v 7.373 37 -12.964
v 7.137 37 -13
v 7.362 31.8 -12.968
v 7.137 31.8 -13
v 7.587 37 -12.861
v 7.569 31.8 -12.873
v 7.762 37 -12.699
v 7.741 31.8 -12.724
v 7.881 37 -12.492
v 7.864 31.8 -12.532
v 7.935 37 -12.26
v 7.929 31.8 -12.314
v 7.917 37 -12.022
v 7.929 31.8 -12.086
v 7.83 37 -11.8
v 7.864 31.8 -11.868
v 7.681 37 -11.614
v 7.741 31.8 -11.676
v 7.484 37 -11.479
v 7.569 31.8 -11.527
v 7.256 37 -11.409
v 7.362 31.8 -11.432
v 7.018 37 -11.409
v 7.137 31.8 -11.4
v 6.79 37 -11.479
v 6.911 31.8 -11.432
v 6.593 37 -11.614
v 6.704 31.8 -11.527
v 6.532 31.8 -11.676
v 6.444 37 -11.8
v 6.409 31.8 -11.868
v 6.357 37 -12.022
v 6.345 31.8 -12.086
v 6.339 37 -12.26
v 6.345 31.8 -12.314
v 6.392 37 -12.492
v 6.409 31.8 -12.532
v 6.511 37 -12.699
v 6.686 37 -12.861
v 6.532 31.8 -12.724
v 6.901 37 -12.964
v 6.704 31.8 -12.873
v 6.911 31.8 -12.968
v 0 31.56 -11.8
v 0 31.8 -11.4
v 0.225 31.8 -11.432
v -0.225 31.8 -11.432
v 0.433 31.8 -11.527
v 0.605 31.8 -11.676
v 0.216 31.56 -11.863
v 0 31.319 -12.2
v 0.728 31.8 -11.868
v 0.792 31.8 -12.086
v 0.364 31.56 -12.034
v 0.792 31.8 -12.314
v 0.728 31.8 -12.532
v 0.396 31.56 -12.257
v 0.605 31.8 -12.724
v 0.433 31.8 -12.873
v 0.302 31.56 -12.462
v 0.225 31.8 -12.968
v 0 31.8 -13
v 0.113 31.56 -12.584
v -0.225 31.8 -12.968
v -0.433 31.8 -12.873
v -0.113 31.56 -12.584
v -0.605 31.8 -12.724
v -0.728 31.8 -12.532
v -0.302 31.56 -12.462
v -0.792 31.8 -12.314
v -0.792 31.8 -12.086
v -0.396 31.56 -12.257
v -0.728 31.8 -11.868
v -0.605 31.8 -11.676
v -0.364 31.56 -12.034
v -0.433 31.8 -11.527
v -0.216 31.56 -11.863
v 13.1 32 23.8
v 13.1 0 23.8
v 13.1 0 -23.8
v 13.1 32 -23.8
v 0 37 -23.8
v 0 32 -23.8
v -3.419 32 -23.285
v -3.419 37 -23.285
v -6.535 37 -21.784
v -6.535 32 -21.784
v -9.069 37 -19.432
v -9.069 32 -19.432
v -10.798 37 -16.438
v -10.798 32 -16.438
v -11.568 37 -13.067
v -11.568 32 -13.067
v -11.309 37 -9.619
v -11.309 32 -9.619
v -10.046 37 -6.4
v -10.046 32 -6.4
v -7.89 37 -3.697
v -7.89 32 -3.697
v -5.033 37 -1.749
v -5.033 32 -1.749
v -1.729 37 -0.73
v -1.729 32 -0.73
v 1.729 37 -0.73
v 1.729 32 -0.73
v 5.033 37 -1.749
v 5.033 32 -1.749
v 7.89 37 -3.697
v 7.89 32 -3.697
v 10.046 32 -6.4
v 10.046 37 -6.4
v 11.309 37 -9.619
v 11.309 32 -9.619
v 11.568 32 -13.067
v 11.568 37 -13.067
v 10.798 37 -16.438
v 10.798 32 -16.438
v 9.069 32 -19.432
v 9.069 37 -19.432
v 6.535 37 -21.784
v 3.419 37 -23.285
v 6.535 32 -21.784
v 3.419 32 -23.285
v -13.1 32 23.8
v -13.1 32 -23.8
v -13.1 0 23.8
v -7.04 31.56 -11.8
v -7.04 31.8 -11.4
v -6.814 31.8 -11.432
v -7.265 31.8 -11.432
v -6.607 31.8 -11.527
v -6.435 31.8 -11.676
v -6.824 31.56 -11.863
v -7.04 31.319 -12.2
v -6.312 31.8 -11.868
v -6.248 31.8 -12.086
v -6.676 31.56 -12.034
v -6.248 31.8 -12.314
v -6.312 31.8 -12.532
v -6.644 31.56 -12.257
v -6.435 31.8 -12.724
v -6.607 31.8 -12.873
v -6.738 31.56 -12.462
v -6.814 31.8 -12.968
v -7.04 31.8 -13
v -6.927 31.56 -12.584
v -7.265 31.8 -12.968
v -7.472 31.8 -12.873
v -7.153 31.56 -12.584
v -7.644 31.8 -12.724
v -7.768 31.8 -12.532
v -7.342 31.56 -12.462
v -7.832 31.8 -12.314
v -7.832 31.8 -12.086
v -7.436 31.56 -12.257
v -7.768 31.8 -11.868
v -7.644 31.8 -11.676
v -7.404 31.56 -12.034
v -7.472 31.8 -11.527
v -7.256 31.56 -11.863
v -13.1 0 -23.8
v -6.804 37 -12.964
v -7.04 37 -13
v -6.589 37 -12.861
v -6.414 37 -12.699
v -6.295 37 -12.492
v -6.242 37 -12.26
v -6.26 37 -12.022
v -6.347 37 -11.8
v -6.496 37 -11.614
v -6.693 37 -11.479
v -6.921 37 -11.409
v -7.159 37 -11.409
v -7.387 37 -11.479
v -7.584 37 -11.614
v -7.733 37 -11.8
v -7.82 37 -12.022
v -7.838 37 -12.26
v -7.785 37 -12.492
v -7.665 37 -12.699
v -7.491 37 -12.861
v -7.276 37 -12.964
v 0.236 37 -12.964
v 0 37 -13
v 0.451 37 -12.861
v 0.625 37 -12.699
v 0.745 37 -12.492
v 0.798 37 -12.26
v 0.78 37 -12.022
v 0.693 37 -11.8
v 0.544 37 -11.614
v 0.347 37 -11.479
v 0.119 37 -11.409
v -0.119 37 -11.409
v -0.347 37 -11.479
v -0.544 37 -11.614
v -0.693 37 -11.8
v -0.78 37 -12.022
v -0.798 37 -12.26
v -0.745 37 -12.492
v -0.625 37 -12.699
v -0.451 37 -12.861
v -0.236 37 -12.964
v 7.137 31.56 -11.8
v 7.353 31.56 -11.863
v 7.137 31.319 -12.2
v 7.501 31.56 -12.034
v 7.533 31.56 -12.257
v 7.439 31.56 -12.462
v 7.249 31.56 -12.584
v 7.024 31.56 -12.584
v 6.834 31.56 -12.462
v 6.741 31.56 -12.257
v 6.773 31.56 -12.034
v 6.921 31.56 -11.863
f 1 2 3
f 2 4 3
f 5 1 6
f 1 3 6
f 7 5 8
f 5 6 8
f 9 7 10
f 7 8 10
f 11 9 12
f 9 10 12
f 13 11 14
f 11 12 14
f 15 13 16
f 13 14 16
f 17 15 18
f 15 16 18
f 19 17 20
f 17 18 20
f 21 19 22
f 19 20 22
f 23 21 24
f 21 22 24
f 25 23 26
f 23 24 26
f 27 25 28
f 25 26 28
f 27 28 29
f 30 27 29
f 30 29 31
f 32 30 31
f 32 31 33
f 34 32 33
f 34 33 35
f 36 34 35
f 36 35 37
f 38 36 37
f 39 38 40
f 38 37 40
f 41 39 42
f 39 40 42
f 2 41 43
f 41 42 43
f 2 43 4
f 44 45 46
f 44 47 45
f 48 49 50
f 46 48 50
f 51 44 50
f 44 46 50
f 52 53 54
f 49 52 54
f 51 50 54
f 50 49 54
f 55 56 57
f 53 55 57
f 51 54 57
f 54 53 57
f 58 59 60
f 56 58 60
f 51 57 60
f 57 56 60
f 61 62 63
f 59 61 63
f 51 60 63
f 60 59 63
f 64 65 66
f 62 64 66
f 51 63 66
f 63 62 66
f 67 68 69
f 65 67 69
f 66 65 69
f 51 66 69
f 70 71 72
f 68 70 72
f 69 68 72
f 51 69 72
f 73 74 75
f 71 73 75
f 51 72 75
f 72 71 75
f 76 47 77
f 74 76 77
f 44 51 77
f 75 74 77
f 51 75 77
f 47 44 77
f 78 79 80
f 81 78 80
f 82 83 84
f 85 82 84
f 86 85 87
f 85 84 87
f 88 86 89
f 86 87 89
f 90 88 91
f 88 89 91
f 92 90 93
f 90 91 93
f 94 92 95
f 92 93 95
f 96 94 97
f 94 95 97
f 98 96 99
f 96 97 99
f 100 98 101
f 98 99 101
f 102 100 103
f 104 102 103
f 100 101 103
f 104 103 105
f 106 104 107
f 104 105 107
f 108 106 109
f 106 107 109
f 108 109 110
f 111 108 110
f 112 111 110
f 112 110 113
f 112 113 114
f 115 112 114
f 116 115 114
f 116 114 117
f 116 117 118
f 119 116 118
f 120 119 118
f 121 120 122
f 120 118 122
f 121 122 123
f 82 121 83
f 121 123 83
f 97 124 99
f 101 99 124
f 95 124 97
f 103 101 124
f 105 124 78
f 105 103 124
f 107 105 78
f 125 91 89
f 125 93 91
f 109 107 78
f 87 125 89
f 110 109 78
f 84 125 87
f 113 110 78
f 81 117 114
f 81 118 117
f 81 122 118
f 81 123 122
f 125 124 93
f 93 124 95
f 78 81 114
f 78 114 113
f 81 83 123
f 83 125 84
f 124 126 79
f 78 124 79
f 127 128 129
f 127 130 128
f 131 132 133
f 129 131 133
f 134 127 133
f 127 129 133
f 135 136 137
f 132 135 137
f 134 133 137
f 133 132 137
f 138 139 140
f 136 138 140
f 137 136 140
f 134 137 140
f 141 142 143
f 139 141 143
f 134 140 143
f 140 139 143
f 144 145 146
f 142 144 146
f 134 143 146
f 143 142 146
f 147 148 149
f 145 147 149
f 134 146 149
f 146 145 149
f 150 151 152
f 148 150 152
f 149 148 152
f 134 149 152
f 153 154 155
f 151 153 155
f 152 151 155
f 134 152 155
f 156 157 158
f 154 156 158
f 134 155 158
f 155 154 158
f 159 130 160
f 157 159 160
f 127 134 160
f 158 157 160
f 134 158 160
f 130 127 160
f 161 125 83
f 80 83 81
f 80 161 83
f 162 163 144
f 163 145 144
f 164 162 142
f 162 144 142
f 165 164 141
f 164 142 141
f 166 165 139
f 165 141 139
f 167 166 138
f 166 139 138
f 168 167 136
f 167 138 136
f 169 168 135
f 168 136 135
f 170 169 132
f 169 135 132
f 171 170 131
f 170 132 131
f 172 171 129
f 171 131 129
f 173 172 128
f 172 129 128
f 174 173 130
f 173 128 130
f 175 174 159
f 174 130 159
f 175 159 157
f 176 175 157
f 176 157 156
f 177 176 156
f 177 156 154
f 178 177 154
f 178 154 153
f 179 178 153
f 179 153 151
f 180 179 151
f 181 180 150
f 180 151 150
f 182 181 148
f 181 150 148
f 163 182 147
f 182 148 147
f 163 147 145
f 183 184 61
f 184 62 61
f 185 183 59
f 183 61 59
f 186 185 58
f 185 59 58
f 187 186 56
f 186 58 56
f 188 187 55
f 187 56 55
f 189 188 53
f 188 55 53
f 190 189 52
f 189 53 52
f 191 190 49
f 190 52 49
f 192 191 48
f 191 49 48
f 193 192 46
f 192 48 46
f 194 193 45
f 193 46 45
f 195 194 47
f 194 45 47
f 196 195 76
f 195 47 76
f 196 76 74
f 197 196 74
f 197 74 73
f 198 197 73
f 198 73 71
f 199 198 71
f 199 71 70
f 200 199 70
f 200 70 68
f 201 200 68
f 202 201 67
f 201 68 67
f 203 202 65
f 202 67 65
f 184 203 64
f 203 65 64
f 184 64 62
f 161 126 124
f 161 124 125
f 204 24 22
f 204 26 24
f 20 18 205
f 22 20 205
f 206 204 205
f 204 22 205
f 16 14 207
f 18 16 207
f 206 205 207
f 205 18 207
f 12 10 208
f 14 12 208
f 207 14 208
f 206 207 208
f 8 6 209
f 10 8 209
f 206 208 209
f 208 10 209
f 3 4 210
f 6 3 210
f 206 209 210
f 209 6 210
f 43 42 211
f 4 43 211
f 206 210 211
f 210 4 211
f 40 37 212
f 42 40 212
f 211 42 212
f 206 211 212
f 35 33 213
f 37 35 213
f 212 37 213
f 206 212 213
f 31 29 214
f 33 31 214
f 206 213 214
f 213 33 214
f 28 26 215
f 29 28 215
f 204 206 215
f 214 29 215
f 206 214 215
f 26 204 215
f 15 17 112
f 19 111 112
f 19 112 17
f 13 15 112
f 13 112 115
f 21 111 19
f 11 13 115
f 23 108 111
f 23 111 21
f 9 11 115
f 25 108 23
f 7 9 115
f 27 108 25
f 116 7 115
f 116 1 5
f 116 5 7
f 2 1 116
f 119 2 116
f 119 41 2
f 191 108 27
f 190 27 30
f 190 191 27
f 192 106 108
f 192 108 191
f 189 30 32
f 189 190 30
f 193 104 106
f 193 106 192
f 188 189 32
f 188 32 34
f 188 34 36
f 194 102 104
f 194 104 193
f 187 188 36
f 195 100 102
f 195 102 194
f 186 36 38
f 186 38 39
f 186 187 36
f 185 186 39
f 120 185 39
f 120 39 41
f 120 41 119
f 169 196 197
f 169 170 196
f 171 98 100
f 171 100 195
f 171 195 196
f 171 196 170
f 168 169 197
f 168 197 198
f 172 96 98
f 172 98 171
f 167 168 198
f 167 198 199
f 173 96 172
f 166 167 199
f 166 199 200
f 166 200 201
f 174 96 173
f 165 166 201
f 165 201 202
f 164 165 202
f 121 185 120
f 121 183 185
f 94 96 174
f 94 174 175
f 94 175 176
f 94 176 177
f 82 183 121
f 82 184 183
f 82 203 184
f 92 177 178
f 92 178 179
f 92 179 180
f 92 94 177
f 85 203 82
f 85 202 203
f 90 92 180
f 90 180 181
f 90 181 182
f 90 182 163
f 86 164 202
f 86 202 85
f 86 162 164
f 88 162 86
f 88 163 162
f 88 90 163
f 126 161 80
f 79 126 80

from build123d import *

# Parameters (mm, degrees)
SKETCH1_W                 = 26.2
SKETCH1_H                 = 47.6
BOSS_EXTRUDE1_DEPTH       = 32
SKETCH2_R                 = 11.6
BOSS_EXTRUDE2_DEPTH       = 5
M2X0_4_TAPPED_HOLE1_D     = 1.6
M2X0_4_TAPPED_HOLE1_DEPTH = 5.2
M2X0_4_TAPPED_HOLE1_TIP   = 0.480688495


with BuildPart() as part:
    # Sketch1 → Boss-Extrude1 (new body)
    with BuildSketch(Plane(origin=(0, 0, 0), x_dir=(1, 0, 0), z_dir=(0, 1, 0))):
        Rectangle(SKETCH1_W, SKETCH1_H)
    extrude(amount=BOSS_EXTRUDE1_DEPTH)

    # Sketch2 → Boss-Extrude2 (add)
    with BuildSketch(Plane(origin=(0, 32, 0), x_dir=(-1, 0, 0), z_dir=(0, 1, 0))):
        with Locations(Location((0, -12.2, 0), (0, 0, 270))):
            Circle(SKETCH2_R)
    extrude(amount=BOSS_EXTRUDE2_DEPTH)

    # M2x0.4 Tapped Hole1
    with Locations(Plane(origin=(0, 37, -12.2), x_dir=(0, 0, 1), z_dir=(0, 1, 0))):
        with Locations((0, 0), (0, -7.039859919), (0, 7.136767925)):
            Hole(M2X0_4_TAPPED_HOLE1_D / 2, depth=M2X0_4_TAPPED_HOLE1_DEPTH)
            with Locations((0, 0, -(M2X0_4_TAPPED_HOLE1_DEPTH + M2X0_4_TAPPED_HOLE1_TIP / 2))):  # 118° drill point
                Cone(0, M2X0_4_TAPPED_HOLE1_D / 2, M2X0_4_TAPPED_HOLE1_TIP, mode=Mode.SUBTRACT)


solid = part.part
